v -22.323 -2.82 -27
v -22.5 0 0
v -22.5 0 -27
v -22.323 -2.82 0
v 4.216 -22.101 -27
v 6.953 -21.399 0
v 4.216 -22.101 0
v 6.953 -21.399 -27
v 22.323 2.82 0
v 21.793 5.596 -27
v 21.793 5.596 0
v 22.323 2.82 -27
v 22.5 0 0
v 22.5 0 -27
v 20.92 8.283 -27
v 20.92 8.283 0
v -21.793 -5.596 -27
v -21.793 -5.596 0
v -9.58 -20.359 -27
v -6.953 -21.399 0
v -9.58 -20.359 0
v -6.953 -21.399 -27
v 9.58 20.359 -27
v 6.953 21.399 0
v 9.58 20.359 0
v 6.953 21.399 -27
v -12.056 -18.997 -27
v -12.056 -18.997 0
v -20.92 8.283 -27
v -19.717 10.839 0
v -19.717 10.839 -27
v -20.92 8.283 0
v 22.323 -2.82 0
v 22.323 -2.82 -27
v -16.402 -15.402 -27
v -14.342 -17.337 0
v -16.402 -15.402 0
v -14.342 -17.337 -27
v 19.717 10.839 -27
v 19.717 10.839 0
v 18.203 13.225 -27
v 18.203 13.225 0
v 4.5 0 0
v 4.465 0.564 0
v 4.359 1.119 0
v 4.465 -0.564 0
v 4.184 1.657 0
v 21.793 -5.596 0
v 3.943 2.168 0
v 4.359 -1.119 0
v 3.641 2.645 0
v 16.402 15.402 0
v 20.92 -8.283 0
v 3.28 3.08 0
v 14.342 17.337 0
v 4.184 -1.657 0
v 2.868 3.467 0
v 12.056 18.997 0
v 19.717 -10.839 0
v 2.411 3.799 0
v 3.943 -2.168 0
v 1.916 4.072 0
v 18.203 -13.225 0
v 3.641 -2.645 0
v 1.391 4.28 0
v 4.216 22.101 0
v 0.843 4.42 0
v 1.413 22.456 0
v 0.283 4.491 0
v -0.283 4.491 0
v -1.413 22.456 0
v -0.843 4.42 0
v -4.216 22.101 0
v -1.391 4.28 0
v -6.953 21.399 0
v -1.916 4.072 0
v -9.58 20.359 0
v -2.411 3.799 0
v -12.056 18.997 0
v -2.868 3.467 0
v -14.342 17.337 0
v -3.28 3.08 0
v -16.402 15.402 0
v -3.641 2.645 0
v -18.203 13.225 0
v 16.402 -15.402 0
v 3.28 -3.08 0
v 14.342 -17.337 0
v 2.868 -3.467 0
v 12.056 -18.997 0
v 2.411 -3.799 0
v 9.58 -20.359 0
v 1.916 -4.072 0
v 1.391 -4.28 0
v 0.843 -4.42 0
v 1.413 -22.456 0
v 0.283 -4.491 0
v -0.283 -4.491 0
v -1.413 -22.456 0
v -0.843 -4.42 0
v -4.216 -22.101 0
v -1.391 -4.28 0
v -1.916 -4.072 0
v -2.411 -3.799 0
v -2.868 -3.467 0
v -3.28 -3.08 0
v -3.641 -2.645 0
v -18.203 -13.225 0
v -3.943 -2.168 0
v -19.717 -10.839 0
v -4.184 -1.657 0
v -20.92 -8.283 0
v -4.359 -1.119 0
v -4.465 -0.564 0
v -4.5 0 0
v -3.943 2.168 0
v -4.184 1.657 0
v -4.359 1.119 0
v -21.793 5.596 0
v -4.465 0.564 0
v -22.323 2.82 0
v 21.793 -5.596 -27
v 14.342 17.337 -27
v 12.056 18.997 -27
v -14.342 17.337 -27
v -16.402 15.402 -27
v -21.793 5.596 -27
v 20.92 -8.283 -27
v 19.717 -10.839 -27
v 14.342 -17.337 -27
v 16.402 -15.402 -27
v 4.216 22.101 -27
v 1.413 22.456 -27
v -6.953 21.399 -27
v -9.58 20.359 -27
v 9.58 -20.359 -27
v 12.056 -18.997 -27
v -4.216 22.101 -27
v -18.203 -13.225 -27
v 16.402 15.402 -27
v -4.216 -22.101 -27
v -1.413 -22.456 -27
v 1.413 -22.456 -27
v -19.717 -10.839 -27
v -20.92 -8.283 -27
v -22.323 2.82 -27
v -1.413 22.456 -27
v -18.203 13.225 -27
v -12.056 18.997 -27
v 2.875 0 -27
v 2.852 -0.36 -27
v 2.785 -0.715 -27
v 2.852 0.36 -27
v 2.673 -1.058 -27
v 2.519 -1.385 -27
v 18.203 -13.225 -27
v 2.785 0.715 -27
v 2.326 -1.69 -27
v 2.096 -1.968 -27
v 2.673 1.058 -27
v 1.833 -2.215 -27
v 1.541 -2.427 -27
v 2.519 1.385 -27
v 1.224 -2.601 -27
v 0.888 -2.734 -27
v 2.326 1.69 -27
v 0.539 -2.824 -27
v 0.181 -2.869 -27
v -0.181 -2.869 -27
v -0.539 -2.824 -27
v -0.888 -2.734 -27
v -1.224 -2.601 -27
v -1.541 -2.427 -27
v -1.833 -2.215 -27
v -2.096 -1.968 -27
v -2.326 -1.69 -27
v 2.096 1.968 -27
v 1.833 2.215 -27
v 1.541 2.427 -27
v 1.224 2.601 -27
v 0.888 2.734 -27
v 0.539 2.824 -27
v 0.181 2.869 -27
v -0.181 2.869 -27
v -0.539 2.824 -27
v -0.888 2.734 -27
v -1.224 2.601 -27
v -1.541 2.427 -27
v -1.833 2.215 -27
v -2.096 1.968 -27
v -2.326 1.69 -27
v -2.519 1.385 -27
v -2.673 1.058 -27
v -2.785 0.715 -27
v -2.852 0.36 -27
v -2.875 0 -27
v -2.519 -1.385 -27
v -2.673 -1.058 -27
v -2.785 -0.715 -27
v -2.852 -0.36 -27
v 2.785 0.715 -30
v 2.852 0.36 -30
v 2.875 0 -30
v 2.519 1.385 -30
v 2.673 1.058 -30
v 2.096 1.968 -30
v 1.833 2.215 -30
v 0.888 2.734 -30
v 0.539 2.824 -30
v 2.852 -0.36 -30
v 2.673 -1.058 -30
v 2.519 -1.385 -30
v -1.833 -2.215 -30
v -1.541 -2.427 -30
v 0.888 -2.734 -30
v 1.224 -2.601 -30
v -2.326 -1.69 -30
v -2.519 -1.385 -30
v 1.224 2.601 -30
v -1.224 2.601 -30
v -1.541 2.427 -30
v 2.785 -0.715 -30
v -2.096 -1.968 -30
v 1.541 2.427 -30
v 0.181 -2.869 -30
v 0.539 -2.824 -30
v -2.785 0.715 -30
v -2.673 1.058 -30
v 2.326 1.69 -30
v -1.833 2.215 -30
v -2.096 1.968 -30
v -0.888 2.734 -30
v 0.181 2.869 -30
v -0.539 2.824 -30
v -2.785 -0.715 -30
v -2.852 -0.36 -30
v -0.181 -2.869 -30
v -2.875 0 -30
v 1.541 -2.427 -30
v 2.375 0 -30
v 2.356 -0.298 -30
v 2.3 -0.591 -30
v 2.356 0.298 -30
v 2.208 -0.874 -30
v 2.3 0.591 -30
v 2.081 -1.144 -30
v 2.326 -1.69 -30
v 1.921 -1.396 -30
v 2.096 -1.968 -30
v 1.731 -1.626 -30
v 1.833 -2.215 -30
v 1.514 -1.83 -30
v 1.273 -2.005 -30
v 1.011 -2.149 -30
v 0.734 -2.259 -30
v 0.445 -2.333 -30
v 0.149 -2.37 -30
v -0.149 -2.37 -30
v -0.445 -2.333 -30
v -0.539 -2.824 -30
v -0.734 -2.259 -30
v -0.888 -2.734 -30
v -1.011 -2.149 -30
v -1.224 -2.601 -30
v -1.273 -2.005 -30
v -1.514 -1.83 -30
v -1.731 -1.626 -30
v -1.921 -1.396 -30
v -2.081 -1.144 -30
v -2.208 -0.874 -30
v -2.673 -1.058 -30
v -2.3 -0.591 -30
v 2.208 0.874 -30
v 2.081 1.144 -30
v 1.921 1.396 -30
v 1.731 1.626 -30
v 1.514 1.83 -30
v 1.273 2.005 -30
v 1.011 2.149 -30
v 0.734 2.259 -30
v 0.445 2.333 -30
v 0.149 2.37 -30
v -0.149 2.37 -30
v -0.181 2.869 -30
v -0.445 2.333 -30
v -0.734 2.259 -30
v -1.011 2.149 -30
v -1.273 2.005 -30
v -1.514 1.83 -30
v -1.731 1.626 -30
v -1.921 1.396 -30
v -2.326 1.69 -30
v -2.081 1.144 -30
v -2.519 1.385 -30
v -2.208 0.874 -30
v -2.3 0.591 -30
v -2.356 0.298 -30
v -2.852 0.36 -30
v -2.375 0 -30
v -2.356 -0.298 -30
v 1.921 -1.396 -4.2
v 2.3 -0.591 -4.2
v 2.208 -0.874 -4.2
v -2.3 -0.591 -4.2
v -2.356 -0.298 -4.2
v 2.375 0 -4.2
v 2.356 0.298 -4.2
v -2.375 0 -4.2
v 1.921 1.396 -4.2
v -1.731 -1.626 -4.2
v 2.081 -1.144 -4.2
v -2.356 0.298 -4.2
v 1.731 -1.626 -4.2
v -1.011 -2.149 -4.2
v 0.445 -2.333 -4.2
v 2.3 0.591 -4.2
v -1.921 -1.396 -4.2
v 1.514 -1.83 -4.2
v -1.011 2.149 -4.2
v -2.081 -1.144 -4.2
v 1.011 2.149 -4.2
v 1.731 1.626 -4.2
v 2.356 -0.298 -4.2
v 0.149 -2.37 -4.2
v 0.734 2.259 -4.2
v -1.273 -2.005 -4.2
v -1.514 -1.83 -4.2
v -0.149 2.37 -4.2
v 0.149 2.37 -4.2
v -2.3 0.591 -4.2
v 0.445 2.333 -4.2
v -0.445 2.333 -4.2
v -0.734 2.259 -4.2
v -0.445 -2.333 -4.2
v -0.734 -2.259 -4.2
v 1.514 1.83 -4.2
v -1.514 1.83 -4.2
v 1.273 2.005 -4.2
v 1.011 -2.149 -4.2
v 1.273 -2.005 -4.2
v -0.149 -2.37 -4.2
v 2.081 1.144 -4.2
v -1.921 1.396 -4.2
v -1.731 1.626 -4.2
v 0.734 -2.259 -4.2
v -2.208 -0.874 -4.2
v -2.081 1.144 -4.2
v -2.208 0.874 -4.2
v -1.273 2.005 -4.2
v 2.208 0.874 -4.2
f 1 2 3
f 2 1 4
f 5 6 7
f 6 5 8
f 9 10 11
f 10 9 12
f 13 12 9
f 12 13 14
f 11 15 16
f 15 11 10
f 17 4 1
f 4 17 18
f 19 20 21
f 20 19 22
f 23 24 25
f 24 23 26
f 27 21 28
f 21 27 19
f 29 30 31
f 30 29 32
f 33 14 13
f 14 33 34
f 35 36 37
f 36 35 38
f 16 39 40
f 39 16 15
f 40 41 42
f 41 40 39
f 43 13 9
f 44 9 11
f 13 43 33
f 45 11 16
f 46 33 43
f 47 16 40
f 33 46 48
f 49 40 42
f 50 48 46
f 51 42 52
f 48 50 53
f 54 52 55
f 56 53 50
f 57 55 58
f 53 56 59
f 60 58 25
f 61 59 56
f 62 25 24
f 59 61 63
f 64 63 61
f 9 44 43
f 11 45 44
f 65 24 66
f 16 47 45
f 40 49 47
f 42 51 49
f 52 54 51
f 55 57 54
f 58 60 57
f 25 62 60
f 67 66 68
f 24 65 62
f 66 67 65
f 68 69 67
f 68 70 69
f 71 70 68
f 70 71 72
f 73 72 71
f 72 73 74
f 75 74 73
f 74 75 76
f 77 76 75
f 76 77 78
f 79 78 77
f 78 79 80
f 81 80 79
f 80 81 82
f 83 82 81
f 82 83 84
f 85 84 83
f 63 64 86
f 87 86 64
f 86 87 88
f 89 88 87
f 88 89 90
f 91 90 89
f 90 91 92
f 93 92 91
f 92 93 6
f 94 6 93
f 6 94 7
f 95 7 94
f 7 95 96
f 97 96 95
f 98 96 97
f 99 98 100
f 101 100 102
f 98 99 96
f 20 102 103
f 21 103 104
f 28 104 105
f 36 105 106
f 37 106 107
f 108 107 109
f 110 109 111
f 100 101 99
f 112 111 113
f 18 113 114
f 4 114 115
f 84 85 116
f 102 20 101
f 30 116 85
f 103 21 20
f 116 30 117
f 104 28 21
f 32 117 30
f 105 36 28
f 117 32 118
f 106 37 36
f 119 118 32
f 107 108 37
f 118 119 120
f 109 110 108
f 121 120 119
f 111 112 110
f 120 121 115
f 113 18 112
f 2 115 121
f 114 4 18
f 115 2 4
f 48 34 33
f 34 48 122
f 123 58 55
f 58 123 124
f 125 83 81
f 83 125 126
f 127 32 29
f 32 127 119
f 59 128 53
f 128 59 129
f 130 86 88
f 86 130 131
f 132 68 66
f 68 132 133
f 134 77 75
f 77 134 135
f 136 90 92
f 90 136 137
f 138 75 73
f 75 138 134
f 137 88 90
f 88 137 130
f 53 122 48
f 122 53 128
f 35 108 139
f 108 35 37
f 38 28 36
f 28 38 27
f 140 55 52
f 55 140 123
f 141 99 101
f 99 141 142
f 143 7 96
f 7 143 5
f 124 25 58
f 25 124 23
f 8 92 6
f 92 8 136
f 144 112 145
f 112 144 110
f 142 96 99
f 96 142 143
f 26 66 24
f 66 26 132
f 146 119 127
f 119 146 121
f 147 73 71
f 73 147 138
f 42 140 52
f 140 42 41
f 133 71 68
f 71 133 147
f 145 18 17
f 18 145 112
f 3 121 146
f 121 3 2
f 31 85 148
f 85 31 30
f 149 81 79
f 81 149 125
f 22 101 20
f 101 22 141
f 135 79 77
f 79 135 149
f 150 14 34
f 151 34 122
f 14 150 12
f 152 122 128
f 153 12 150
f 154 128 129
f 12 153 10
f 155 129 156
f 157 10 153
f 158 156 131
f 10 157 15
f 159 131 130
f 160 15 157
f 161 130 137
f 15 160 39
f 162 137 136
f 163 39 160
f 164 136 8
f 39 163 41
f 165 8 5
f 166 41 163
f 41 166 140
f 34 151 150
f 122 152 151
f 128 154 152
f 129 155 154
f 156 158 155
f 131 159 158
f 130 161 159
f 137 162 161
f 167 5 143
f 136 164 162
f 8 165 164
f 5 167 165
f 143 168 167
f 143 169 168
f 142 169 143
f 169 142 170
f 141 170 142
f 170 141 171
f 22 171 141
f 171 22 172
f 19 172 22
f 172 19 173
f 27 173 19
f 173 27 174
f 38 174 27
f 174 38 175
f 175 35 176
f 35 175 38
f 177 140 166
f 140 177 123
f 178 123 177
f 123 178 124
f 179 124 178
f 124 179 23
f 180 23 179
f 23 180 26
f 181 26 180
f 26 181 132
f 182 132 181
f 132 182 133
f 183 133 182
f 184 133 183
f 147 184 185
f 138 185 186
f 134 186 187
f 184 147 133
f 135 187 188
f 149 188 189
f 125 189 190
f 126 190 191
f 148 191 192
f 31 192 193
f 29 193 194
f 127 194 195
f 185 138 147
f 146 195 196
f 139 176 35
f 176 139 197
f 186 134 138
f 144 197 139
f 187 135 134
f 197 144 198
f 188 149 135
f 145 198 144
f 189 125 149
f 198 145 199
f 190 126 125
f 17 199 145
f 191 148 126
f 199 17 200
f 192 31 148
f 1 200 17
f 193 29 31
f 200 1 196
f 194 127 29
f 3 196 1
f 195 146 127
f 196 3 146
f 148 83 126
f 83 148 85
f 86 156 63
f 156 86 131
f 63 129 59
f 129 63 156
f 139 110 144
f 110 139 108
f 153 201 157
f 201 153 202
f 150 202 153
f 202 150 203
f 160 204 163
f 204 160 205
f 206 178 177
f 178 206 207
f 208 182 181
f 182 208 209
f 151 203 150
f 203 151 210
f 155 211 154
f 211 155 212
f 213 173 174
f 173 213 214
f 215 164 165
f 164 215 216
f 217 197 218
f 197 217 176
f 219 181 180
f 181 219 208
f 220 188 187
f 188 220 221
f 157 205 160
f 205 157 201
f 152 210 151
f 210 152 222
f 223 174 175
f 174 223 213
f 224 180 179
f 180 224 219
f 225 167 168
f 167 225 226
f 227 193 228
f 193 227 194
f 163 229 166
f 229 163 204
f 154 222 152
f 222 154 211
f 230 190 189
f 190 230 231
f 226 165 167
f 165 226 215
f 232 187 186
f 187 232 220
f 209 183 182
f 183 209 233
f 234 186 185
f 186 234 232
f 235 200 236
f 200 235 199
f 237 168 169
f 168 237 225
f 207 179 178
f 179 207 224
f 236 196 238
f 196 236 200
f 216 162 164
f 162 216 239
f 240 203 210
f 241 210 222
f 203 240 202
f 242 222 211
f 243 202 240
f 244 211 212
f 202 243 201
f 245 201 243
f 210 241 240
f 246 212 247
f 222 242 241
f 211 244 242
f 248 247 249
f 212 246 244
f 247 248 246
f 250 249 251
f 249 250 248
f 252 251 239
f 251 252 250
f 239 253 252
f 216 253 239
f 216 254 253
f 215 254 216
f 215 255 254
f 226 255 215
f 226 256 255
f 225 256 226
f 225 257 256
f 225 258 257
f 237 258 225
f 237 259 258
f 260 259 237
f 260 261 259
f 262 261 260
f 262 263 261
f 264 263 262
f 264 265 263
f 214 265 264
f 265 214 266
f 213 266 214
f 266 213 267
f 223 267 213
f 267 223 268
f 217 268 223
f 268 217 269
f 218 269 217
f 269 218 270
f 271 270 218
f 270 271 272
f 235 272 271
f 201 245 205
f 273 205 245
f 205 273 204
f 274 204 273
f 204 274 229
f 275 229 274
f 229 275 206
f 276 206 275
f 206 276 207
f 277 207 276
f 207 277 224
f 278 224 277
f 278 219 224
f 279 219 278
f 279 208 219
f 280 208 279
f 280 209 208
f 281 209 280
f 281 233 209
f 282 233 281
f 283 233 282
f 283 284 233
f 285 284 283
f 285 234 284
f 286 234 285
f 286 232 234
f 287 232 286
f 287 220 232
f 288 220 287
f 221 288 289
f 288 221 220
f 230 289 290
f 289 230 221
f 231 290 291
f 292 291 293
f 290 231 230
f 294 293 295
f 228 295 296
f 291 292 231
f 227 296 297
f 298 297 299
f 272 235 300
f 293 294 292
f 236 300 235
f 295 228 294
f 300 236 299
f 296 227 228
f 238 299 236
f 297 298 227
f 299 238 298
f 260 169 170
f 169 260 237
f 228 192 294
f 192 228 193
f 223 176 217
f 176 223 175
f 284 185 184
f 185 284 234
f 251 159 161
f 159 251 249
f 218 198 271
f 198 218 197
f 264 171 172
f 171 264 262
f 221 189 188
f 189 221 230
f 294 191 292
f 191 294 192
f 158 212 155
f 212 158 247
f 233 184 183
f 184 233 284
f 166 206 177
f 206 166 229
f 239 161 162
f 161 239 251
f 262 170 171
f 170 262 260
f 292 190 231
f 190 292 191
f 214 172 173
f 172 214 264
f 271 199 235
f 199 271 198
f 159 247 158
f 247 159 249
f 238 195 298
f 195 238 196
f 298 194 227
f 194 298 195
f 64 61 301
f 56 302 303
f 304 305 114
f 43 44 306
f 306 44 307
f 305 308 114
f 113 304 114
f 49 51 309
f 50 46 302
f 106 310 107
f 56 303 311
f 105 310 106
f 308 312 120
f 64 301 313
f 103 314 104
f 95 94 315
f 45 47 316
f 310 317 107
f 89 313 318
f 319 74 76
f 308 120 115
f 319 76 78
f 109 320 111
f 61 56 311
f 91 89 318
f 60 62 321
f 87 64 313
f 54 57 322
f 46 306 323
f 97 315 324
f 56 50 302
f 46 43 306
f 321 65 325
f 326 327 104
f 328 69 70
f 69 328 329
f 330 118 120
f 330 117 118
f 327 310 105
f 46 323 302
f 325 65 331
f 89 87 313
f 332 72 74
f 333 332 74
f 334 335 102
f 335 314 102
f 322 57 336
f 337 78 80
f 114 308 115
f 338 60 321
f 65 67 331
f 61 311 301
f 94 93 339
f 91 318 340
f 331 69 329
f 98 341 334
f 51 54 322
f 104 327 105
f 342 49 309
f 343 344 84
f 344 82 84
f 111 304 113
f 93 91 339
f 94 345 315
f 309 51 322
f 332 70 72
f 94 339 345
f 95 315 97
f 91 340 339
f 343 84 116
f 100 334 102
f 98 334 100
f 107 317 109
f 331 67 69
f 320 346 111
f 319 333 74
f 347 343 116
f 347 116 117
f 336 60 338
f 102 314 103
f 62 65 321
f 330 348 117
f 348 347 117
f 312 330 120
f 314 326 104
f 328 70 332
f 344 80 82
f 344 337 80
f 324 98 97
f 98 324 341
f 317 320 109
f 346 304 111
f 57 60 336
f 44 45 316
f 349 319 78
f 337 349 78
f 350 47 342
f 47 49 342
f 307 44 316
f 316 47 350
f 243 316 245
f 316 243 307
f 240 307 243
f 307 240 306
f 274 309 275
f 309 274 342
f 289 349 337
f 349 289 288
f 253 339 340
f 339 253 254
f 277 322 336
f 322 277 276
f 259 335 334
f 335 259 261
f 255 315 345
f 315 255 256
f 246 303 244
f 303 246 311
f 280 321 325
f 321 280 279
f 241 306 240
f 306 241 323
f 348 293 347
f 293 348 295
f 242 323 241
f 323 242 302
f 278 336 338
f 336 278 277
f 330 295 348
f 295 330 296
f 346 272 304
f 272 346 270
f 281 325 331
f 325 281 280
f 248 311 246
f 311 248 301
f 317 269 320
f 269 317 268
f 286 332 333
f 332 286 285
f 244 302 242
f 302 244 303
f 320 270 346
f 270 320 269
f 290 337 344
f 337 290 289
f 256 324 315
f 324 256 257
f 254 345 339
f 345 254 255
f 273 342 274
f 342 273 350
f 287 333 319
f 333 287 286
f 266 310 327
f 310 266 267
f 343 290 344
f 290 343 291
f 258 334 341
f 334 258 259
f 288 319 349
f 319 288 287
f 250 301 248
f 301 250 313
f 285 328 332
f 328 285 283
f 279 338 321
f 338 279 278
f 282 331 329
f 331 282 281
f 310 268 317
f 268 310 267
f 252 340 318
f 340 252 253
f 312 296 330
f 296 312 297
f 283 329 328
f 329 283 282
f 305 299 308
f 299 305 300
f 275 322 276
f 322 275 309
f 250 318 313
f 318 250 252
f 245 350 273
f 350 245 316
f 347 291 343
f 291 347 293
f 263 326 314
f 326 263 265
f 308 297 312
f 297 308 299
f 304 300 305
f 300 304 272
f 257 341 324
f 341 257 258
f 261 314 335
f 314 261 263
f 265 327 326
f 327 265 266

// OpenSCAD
$fn = 50;

difference() {
	union() {
		translate(v = [0, 0, -27.0]) {
			cylinder(h = 27, r = 22.5);
		}
		#translate(v = [0, 0, -30.0]) {
			cylinder(h = 30, r = 2.875);
		}
	}
	union() {
		translate(v = [0, 0, 0]) {
			rotate(a = [0, 0, 0]) {
				difference() {
					union() {
						translate(v = [0, 0, -30.0]) {
							cylinder(h = 30, r = 2.25);
						}
						translate(v = [0, 0, -4.2]) {
							cylinder(h = 4.2, r1 = 2.375, r2 = 4.5);
						}
						translate(v = [0, 0, -30.0]) {
							cylinder(h = 30, r = 2.375);
						}
						translate(v = [0, 0, -30.0]) {
							cylinder(h = 30, r = 2.25);
						}
					}
					union();
				}
			}
		}
	}
}
